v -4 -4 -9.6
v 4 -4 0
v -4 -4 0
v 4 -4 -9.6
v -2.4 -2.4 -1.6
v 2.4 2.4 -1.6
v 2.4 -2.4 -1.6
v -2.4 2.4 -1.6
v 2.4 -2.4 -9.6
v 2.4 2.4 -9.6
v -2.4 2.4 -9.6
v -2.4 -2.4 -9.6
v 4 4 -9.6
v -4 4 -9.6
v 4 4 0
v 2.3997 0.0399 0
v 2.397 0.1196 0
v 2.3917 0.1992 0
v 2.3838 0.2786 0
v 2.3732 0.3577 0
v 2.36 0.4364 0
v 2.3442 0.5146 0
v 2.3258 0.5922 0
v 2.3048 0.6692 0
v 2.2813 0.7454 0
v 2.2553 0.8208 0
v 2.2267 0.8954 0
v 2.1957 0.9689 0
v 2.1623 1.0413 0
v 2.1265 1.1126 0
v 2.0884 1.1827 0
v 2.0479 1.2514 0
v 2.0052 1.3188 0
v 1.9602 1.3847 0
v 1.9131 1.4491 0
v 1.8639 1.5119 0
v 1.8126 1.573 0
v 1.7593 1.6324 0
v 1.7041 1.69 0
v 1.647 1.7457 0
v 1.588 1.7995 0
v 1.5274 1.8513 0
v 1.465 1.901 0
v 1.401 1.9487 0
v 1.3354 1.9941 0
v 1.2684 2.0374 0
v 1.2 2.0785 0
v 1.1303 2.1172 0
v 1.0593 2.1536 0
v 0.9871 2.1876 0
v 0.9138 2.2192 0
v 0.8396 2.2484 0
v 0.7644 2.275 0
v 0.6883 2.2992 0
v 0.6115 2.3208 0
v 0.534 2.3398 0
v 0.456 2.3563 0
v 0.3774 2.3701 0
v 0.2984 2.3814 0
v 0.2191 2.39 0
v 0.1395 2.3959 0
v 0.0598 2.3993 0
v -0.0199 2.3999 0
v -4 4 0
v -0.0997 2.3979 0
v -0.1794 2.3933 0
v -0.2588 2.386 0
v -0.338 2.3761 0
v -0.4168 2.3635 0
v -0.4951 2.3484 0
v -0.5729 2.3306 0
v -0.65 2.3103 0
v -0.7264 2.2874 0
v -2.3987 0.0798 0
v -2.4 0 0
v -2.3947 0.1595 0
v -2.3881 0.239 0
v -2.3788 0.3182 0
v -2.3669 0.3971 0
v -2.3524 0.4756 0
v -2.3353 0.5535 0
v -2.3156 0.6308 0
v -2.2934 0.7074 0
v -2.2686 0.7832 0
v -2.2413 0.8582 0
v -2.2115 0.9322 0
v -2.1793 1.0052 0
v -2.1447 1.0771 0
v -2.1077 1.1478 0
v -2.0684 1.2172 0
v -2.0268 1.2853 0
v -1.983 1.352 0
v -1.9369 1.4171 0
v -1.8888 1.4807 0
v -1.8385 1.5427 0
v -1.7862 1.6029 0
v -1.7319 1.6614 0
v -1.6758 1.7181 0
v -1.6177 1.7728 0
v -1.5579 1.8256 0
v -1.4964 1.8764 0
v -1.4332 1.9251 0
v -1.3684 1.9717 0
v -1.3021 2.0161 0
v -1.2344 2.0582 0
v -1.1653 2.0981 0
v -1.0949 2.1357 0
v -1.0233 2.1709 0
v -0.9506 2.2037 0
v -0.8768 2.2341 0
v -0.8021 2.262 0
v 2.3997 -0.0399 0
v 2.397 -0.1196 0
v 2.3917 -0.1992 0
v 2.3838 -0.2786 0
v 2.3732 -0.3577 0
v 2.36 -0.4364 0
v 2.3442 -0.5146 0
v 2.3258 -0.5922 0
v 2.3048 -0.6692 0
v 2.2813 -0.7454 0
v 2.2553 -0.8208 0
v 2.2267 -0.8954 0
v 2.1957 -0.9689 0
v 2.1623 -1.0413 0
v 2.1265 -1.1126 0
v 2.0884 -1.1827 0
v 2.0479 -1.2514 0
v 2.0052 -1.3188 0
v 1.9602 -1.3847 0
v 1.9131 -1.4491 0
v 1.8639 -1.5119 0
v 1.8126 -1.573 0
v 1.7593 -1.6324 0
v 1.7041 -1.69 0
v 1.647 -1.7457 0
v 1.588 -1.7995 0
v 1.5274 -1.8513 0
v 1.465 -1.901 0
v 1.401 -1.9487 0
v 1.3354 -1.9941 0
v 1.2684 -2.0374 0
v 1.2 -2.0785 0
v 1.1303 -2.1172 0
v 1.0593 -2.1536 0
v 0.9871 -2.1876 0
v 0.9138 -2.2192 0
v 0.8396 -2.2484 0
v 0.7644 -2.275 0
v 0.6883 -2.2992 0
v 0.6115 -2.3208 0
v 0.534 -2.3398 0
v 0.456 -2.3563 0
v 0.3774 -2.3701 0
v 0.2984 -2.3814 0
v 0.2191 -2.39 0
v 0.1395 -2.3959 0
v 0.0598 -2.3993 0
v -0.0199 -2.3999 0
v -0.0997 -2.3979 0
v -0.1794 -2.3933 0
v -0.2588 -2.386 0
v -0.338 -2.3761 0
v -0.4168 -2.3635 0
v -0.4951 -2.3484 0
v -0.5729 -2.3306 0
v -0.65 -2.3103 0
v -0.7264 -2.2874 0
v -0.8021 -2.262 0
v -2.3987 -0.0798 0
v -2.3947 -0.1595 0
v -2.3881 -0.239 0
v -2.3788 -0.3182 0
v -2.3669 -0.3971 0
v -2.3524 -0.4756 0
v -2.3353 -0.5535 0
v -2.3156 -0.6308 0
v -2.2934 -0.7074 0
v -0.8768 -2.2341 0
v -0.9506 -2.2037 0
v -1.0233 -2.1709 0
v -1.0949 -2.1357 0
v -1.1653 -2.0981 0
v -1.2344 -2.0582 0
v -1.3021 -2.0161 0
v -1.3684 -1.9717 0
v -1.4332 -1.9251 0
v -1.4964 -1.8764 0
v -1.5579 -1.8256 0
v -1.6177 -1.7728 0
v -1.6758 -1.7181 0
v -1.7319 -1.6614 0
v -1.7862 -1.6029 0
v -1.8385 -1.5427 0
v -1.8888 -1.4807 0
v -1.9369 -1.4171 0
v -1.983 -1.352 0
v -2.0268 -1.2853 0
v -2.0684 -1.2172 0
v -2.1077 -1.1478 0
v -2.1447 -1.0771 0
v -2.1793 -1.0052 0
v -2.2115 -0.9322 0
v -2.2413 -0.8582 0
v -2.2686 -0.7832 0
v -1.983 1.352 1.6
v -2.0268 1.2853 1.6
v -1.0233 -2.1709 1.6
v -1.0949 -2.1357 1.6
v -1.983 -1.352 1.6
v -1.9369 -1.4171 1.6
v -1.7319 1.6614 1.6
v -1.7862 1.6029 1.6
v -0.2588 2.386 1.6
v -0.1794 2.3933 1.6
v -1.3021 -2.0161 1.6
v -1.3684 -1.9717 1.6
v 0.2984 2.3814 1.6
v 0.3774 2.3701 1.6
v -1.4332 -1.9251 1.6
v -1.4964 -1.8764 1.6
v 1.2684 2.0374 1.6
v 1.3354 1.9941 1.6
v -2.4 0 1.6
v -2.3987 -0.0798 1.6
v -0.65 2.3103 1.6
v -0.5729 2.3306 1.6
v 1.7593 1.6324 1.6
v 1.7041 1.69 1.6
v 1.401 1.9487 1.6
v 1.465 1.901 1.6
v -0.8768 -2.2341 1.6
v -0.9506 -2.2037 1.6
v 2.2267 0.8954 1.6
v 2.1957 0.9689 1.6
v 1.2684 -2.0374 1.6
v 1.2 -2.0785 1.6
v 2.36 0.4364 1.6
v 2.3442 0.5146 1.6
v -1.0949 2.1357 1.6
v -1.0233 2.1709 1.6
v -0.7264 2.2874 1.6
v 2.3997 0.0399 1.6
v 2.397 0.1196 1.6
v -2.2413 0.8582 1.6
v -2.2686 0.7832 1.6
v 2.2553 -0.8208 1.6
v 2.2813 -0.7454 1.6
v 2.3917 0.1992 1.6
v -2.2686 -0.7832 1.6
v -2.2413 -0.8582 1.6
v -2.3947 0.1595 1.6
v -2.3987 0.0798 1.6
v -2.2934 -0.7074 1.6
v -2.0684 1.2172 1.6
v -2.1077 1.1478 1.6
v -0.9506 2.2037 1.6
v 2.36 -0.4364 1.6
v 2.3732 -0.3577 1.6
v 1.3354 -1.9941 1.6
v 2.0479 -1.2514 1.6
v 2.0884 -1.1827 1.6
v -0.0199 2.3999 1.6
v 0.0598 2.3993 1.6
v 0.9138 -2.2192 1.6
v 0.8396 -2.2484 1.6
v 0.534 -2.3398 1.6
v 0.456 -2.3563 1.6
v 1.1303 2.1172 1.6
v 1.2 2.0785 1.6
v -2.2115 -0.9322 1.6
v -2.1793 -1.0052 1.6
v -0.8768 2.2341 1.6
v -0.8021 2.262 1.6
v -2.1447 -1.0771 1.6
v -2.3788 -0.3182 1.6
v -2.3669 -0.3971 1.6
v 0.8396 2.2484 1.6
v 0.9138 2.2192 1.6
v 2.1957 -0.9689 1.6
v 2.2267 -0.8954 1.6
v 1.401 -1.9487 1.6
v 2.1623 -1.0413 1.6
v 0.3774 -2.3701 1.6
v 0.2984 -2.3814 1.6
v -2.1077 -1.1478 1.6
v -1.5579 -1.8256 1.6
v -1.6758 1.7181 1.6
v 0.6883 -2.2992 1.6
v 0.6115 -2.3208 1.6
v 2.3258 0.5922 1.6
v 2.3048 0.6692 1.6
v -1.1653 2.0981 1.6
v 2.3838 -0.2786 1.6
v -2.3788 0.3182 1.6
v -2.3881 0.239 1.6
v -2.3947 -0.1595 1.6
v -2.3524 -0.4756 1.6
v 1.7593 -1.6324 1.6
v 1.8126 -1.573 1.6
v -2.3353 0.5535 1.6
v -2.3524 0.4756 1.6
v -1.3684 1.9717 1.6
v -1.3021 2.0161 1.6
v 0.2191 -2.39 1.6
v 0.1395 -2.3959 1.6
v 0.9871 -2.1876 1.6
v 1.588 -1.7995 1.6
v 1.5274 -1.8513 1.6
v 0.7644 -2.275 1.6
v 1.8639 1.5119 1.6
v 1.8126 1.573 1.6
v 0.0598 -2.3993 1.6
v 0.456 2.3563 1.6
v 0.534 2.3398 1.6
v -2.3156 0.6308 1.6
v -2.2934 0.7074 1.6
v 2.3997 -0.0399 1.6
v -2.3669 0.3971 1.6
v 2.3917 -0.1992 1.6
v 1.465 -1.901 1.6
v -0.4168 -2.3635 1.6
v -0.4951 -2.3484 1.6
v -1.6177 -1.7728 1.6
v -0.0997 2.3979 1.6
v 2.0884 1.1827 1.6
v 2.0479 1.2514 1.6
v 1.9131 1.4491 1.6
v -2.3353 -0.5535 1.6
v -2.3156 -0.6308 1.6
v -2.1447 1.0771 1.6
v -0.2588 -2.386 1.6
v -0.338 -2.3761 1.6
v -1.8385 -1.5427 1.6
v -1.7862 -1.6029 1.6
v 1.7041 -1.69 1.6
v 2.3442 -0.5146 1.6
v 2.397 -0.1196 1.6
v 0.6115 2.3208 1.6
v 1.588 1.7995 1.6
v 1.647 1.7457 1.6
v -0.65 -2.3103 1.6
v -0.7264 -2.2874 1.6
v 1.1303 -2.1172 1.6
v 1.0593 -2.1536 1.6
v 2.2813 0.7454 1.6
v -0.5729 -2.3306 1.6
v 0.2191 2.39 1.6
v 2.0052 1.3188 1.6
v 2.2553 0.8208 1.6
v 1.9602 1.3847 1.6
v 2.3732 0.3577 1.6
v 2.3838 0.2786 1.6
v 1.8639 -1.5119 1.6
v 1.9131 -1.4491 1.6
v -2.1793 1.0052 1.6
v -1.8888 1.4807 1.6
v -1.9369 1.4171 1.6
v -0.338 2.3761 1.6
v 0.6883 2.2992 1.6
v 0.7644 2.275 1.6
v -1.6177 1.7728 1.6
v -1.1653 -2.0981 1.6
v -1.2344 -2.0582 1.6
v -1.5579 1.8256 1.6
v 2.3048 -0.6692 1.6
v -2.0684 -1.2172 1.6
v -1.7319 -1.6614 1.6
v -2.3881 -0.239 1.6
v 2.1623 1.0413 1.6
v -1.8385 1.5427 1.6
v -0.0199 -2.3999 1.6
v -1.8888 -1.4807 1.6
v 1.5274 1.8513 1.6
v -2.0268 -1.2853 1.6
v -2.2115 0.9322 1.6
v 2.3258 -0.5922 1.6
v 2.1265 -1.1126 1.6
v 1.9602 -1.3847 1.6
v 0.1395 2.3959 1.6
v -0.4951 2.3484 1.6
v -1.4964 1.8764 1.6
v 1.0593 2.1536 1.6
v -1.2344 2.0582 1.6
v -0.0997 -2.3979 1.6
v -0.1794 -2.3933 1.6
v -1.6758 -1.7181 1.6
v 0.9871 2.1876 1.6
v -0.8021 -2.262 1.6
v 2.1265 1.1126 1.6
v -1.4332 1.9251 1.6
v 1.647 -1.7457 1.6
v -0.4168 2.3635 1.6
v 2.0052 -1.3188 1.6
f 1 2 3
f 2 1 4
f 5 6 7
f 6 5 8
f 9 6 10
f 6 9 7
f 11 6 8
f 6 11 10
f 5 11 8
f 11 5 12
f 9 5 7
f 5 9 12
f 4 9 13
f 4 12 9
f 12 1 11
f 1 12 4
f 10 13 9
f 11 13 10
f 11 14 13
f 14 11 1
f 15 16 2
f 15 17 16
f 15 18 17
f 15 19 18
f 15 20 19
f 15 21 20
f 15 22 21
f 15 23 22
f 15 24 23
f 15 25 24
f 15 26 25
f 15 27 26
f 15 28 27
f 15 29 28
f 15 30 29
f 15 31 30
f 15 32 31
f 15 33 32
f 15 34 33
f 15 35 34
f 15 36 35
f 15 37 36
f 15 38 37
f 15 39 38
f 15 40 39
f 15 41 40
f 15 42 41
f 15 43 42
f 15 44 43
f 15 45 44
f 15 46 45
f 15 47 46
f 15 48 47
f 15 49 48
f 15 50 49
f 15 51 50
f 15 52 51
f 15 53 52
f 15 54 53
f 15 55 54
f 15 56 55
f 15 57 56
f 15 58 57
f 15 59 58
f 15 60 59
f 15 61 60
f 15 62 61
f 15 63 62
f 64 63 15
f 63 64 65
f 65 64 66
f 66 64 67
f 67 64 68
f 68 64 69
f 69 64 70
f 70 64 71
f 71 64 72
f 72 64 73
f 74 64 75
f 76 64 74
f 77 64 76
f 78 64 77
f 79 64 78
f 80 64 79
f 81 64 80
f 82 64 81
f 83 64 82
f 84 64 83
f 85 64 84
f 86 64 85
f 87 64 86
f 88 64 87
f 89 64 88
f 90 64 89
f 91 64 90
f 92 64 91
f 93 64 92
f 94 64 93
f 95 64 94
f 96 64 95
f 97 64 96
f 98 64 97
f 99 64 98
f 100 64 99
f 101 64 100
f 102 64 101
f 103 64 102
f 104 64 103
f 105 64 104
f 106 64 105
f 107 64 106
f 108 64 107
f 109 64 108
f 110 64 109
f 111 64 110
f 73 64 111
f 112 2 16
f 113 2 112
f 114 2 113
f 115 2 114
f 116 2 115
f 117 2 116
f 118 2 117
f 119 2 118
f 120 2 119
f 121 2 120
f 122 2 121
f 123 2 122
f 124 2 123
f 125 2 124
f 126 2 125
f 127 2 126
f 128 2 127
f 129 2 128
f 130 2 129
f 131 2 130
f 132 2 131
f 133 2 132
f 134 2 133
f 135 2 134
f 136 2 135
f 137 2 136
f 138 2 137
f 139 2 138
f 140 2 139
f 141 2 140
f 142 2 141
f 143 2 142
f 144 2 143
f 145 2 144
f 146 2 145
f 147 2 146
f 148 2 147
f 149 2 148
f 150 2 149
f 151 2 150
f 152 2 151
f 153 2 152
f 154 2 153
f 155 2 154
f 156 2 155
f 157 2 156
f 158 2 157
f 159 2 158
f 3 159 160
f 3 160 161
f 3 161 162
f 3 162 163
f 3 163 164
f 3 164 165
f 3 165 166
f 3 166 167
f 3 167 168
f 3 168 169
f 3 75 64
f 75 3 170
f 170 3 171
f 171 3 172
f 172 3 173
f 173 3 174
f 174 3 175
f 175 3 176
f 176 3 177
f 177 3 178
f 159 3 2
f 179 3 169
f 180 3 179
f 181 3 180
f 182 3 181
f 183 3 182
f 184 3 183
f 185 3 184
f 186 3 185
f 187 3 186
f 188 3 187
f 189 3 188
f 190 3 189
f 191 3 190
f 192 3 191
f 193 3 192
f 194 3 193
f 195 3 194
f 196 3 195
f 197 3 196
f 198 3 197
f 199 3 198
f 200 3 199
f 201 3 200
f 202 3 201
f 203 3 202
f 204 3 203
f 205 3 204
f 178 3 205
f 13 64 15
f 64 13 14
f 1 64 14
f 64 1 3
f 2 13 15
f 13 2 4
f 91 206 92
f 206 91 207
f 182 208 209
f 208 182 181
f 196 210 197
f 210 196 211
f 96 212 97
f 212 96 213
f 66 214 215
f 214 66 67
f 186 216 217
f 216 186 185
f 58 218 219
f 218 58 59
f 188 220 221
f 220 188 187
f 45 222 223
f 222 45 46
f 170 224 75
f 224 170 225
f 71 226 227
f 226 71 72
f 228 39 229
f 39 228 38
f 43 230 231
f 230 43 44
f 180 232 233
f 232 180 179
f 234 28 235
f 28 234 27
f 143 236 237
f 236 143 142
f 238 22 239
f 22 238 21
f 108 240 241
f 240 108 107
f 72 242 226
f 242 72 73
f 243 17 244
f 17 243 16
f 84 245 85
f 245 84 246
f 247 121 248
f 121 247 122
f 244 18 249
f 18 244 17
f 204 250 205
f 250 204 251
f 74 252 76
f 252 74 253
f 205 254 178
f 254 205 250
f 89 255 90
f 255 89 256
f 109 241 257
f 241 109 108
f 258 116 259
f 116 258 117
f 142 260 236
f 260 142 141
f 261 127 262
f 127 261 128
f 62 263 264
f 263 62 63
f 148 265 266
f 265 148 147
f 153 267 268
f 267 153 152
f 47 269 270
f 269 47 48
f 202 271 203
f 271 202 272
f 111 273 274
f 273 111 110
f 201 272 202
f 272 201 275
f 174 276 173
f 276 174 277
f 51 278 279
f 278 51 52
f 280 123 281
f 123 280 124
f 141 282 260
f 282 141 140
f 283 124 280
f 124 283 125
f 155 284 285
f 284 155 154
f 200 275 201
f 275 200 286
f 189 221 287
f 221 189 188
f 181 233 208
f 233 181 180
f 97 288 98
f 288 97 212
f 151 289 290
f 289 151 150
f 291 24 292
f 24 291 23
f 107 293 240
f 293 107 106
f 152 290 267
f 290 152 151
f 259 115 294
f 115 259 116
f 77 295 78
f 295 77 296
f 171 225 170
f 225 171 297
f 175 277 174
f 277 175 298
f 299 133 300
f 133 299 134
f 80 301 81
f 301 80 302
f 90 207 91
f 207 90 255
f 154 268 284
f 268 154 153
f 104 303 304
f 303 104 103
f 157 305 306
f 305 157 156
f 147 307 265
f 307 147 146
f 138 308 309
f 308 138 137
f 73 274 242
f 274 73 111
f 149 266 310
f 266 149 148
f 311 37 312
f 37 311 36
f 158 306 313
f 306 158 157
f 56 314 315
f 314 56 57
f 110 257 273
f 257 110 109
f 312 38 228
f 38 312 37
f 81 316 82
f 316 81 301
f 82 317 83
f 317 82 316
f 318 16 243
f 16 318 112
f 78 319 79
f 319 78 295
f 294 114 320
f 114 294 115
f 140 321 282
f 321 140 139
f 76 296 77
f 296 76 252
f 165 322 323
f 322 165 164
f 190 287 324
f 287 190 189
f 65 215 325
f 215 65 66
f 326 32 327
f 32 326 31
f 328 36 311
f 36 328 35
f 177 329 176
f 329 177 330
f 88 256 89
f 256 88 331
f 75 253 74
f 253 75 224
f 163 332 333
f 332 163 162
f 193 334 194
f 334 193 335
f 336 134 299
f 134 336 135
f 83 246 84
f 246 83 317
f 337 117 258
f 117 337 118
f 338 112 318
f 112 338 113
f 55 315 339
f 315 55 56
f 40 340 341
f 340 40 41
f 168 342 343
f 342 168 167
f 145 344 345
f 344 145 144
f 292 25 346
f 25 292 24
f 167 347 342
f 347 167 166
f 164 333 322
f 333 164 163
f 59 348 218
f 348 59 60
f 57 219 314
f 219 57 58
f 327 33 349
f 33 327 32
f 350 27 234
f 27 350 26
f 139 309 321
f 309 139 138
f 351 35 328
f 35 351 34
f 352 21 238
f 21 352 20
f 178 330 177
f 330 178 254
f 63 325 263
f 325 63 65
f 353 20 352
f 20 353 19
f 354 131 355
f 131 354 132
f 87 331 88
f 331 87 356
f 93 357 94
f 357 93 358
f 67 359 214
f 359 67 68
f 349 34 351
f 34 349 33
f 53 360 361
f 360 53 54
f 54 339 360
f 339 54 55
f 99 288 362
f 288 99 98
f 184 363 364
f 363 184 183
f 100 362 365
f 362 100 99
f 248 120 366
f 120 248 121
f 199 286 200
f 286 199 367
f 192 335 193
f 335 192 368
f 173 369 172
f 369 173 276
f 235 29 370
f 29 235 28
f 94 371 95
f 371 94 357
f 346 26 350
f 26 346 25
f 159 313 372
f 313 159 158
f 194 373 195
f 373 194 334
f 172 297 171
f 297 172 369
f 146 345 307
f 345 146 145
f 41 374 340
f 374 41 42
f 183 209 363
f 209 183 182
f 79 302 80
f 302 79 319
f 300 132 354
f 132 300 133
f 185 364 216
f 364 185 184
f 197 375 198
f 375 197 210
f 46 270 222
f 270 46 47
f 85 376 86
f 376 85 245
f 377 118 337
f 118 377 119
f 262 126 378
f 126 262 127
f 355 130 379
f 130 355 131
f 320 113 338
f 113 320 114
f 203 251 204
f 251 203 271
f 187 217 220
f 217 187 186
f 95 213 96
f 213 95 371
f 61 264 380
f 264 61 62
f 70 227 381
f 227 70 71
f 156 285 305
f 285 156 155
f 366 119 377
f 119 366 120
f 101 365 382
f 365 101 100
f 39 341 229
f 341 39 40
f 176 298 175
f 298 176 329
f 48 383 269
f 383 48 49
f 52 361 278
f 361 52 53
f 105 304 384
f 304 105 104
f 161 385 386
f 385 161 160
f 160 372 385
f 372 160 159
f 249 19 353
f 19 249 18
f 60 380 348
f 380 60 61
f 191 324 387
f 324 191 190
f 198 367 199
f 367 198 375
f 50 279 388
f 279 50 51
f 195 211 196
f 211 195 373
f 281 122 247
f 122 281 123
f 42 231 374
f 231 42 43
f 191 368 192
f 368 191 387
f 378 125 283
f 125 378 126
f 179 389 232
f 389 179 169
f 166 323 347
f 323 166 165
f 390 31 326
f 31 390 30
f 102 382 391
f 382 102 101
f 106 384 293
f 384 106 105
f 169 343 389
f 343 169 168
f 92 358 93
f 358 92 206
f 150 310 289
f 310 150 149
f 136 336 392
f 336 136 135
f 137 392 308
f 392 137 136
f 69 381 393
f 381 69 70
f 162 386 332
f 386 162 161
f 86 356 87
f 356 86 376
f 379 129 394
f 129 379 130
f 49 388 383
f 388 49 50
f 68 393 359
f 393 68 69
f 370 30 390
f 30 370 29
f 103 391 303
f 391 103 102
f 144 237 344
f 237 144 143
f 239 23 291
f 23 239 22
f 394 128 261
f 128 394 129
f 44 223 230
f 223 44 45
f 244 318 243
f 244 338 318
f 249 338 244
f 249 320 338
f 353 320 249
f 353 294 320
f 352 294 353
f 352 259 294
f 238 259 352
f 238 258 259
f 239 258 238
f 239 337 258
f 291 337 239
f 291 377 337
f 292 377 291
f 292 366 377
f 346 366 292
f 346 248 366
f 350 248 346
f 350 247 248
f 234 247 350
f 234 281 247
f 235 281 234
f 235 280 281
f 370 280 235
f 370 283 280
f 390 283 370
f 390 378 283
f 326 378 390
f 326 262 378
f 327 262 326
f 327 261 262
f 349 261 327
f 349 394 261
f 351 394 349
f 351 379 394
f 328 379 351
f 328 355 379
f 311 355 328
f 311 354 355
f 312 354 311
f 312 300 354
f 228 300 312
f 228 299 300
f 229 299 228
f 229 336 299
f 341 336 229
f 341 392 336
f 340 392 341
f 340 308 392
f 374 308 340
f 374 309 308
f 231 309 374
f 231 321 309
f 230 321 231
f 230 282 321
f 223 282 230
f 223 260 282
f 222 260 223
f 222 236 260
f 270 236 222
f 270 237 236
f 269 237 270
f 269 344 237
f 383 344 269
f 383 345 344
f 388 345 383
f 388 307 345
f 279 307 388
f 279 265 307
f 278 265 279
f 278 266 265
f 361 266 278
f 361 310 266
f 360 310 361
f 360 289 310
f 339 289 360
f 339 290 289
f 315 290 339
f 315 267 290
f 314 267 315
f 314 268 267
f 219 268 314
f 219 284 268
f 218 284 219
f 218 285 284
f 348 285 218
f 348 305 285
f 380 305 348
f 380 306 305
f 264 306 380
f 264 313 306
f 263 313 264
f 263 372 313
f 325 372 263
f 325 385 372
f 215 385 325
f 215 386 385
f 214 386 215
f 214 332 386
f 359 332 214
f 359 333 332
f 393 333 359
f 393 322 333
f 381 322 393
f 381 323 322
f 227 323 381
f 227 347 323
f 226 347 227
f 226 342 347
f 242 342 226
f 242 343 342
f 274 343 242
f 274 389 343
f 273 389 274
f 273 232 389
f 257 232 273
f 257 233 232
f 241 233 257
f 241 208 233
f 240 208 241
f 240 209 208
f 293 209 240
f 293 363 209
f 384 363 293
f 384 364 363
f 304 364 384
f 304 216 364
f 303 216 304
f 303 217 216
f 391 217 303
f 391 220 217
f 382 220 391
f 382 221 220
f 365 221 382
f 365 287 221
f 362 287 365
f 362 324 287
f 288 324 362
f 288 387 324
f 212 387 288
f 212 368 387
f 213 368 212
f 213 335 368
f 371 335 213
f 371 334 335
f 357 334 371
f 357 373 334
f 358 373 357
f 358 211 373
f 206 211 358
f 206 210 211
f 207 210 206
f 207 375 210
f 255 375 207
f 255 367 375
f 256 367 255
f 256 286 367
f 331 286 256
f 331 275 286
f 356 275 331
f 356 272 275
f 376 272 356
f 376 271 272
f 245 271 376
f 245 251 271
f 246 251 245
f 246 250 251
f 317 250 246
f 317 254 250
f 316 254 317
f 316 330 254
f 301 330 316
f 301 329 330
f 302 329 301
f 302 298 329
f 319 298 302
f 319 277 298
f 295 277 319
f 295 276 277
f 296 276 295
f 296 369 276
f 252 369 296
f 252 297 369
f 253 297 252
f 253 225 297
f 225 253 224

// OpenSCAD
// file: ../p/stud3.scad
use <../lib.scad>
use <4-4cyli.scad>
use <4-4disc.scad>
use <4-4edge.scad>
$fa=1; $fs=0.2;
function ldraw_lib__stud3(realsolid=false) = realsolid ? 
    [openscad(translate([0,0,-eps()], o=cylinder(4+eps(), r=4)),2)] : [
// 0 Stud Tube Solid
// 0 Name: stud3.dat
// 0 Author: James Jessiman
// 0 !LDRAW_ORG Primitive UPDATE 2012-01
// 0 !LICENSE Licensed under CC BY 2.0 and CC BY 4.0 : see CAreadme.txt
// 
// 0 BFC CERTIFY CCW
  [0,"BFC","CERTIFY"],
  [0,"BFC","CCW"],
// 
// 0 !HISTORY 2002-04-04 [sbliss] Modified for BFC compliance
// 0 !HISTORY 2002-04-25 [PTadmin] Official Update 2002-02
// 0 !HISTORY 2007-06-24 [PTadmin] Header formatted for Contributor Agreement
// 0 !HISTORY 2008-07-01 [PTadmin] Official Update 2008-01
// 0 !HISTORY 2012-02-16 [Philo] Changed to CCW
// 0 !HISTORY 2012-03-30 [PTadmin] Official Update 2012-01
// 
// 
// 1 16 0 -4 0 4 0 0 0 1 0 0 0 4 4-4edge.dat
  [1,16,0,-4,0,4,0,0,0,1,0,0,0,4, ldraw_lib__4_4edge(realsolid)],
// 1 16 0 0 0 4 0 0 0 1 0 0 0 4 4-4edge.dat
  [1,16,0,0,0,4,0,0,0,1,0,0,0,4, ldraw_lib__4_4edge(realsolid)],
// 1 16 0 -4 0 4 0 0 0 1 0 0 0 4 4-4disc.dat
  [1,16,0,-4,0,4,0,0,0,1,0,0,0,4, ldraw_lib__4_4disc(realsolid)],
// 1 16 0 -4 0 4 0 0 0 4 0 0 0 4 4-4cyli.dat
  [1,16,0,-4,0,4,0,0,0,4,0,0,0,4, ldraw_lib__4_4cyli(realsolid)],
];
module ldraw_lib__stud3(step=0, col=false, unit=2/5, alt=false, line=0.2, solid=!$preview)
    makepoly(ldraw_lib__stud3(solid), step=step, col=col, unit=unit, alt=alt, line=line, solid=solid);
ldraw_lib__stud3(line=0.2);
// file: ../p/4-4edge.scad
use <../lib.scad>
$fa=1; $fs=0.2;
function ldraw_lib__4_4edge(realsolid=false) = [
// 0 Circle 1.0
// 0 Name: 4-4edge.dat
// 0 Author: James Jessiman
// 0 !LDRAW_ORG Primitive UPDATE 2017-01
// 0 !LICENSE Licensed under CC BY 2.0 and CC BY 4.0 : see CAreadme.txt
// 
// 0 BFC CERTIFY CCW
  [0,"BFC","CERTIFY"],
  [0,"BFC","CCW"],
// 
// 0 !HISTORY 1998-12-15 [PTadmin] Official Update 1998-10
// 0 !HISTORY 2005-12-28 [PTadmin] Official Update 2005-01
// 0 !HISTORY 2007-06-24 [PTadmin] Header formatted for Contributor Agreement
// 0 !HISTORY 2008-07-01 [PTadmin] Official Update 2008-01
// 0 !HISTORY 2017-01-15 [Steffen] BFCed
// 0 !HISTORY 2017-12-30 [PTadmin] Official Update 2017-01
// 
// 
// 2 24 1 0 0 0.9239 0 0.3827
  [2,24,1,0,0,0.9239,0,0.3827],
// 2 24 0.9239 0 0.3827 0.7071 0 0.7071
  [2,24,0.9239,0,0.3827,0.7071,0,0.7071],
// 2 24 0.7071 0 0.7071 0.3827 0 0.9239
  [2,24,0.7071,0,0.7071,0.3827,0,0.9239],
// 2 24 0.3827 0 0.9239 0 0 1
  [2,24,0.3827,0,0.9239,0,0,1],
// 2 24 0 0 1 -0.3827 0 0.9239
  [2,24,0,0,1,-0.3827,0,0.9239],
// 2 24 -0.3827 0 0.9239 -0.7071 0 0.7071
  [2,24,-0.3827,0,0.9239,-0.7071,0,0.7071],
// 2 24 -0.7071 0 0.7071 -0.9239 0 0.3827
  [2,24,-0.7071,0,0.7071,-0.9239,0,0.3827],
// 2 24 -0.9239 0 0.3827 -1 0 -0
  [2,24,-0.9239,0,0.3827,-1,0,-0],
// 2 24 -1 0 -0 -0.9239 0 -0.3827
  [2,24,-1,0,-0,-0.9239,0,-0.3827],
// 2 24 -0.9239 0 -0.3827 -0.7071 0 -0.7071
  [2,24,-0.9239,0,-0.3827,-0.7071,0,-0.7071],
// 2 24 -0.7071 0 -0.7071 -0.3827 0 -0.9239
  [2,24,-0.7071,0,-0.7071,-0.3827,0,-0.9239],
// 2 24 -0.3827 0 -0.9239 0 0 -1
  [2,24,-0.3827,0,-0.9239,0,0,-1],
// 2 24 0 0 -1 0.3827 0 -0.9239
  [2,24,0,0,-1,0.3827,0,-0.9239],
// 2 24 0.3827 0 -0.9239 0.7071 0 -0.7071
  [2,24,0.3827,0,-0.9239,0.7071,0,-0.7071],
// 2 24 0.7071 0 -0.7071 0.9239 0 -0.3827
  [2,24,0.7071,0,-0.7071,0.9239,0,-0.3827],
// 2 24 0.9239 0 -0.3827 1 0 0
  [2,24,0.9239,0,-0.3827,1,0,0],
];
module ldraw_lib__4_4edge(step=0, col=false, unit=2/5, alt=false, line=0.2, solid=!$preview)
    makepoly(ldraw_lib__4_4edge(solid), step=step, col=col, unit=unit, alt=alt, line=line, solid=solid);
ldraw_lib__4_4edge(line=0.2);
// file: ../p/4-4disc.scad
use <../lib.scad>
$fa=1; $fs=0.2;
function ldraw_lib__4_4disc(realsolid=false) = [
// 0 Disc 1.0
// 0 Name: 4-4disc.dat
// 0 Author: James Jessiman
// 0 !LDRAW_ORG Primitive UPDATE 2002-02
// 0 !LICENSE Licensed under CC BY 2.0 and CC BY 4.0 : see CAreadme.txt
// 
// 0 BFC CERTIFY CCW
  [0,"BFC","CERTIFY"],
  [0,"BFC","CCW"],
// 
// 0 !HISTORY 1998-12-15 [PTadmin] Official Update 1998-10
// 0 !HISTORY 2002-03-23 [sbliss] Added BFC statement
// 0 !HISTORY 2002-04-25 [PTadmin] Official Update 2002-02
// 0 !HISTORY 2007-06-24 [PTadmin] Header formatted for Contributor Agreement
// 0 !HISTORY 2008-07-01 [PTadmin] Official Update 2008-01
// 
// 
// 3 16 0 0 0 1 0 0 0.9239 0 0.3827
  [3,16,0,0,0,1,0,0,0.9239,0,0.3827],
// 3 16 0 0 0 0.9239 0 0.3827 0.7071 0 0.7071
  [3,16,0,0,0,0.9239,0,0.3827,0.7071,0,0.7071],
// 3 16 0 0 0 0.7071 0 0.7071 0.3827 0 0.9239
  [3,16,0,0,0,0.7071,0,0.7071,0.3827,0,0.9239],
// 3 16 0 0 0 0.3827 0 0.9239 0 0 1
  [3,16,0,0,0,0.3827,0,0.9239,0,0,1],
// 3 16 0 0 0 0 0 1 -0.3827 0 0.9239
  [3,16,0,0,0,0,0,1,-0.3827,0,0.9239],
// 3 16 0 0 0 -0.3827 0 0.9239 -0.7071 0 0.7071
  [3,16,0,0,0,-0.3827,0,0.9239,-0.7071,0,0.7071],
// 3 16 0 0 0 -0.7071 0 0.7071 -0.9239 0 0.3827
  [3,16,0,0,0,-0.7071,0,0.7071,-0.9239,0,0.3827],
// 3 16 0 0 0 -0.9239 0 0.3827 -1 0 -0
  [3,16,0,0,0,-0.9239,0,0.3827,-1,0,-0],
// 3 16 0 0 0 -1 0 -0 -0.9239 0 -0.3827
  [3,16,0,0,0,-1,0,-0,-0.9239,0,-0.3827],
// 3 16 0 0 0 -0.9239 0 -0.3827 -0.7071 0 -0.7071
  [3,16,0,0,0,-0.9239,0,-0.3827,-0.7071,0,-0.7071],
// 3 16 0 0 0 -0.7071 0 -0.7071 -0.3827 0 -0.9239
  [3,16,0,0,0,-0.7071,0,-0.7071,-0.3827,0,-0.9239],
// 3 16 0 0 0 -0.3827 0 -0.9239 0 0 -1
  [3,16,0,0,0,-0.3827,0,-0.9239,0,0,-1],
// 3 16 0 0 0 0 0 -1 0.3827 0 -0.9239
  [3,16,0,0,0,0,0,-1,0.3827,0,-0.9239],
// 3 16 0 0 0 0.3827 0 -0.9239 0.7071 0 -0.7071
  [3,16,0,0,0,0.3827,0,-0.9239,0.7071,0,-0.7071],
// 3 16 0 0 0 0.7071 0 -0.7071 0.9239 0 -0.3827
  [3,16,0,0,0,0.7071,0,-0.7071,0.9239,0,-0.3827],
// 3 16 0 0 0 0.9239 0 -0.3827 1 0 0
  [3,16,0,0,0,0.9239,0,-0.3827,1,0,0],
// 0
];
module ldraw_lib__4_4disc(step=0, col=false, unit=2/5, alt=false, line=0.2, solid=!$preview)
    makepoly(ldraw_lib__4_4disc(solid), step=step, col=col, unit=unit, alt=alt, line=line, solid=solid);
ldraw_lib__4_4disc(line=0.2);
// file: ../p/4-4cyli.scad
use <../lib.scad>
$fa=1; $fs=0.2;
function ldraw_lib__4_4cyli(realsolid=false) = [
// 0 Cylinder 1.0
// 0 Name: 4-4cyli.dat
// 0 Author: James Jessiman
// 0 !LDRAW_ORG Primitive UPDATE 2005-01
// 0 !LICENSE Licensed under CC BY 2.0 and CC BY 4.0 : see CAreadme.txt
// 
// 0 BFC CERTIFY CCW
  [0,"BFC","CERTIFY"],
  [0,"BFC","CCW"],
// 
// 0 !HISTORY 1998-12-15 [PTadmin] Official Update 1998-10
// 0 !HISTORY 2002-03-23 [sbliss] Added BFC statement; merged headers from files in distributions LDraw 0.27 and Complete.
// 0 !HISTORY 2002-04-25 [PTadmin] Official Update 2002-02
// 0 !HISTORY 2004-12-14 [guyvivan] BFC CCW
// 0 !HISTORY 2005-12-28 [PTadmin] Official Update 2005-01
// 0 !HISTORY 2007-06-24 [PTadmin] Header formatted for Contributor Agreement
// 0 !HISTORY 2008-07-01 [PTadmin] Official Update 2008-01
// 
// 
// 4 16 1 1 0 0.9239 1 0.3827 0.9239 0 0.3827 1 0 0
  [4,16,1,1,0,0.9239,1,0.3827,0.9239,0,0.3827,1,0,0],
// 5 24 1 0 0 1 1 0 0.9239 0 0.3827 0.9239 0 -0.3827
  [5,24,1,0,0,1,1,0,0.9239,0,0.3827,0.9239,0,-0.3827],
// 4 16 0.9239 1 0.3827 0.7071 1 0.7071 0.7071 0 0.7071 0.9239 0 0.3827
  [4,16,0.9239,1,0.3827,0.7071,1,0.7071,0.7071,0,0.7071,0.9239,0,0.3827],
// 5 24 0.9239 0 0.3827 0.9239 1 0.3827 0.7071 0 0.7071 1 0 0
  [5,24,0.9239,0,0.3827,0.9239,1,0.3827,0.7071,0,0.7071,1,0,0],
// 4 16 0.7071 1 0.7071 0.3827 1 0.9239 0.3827 0 0.9239 0.7071 0 0.7071
  [4,16,0.7071,1,0.7071,0.3827,1,0.9239,0.3827,0,0.9239,0.7071,0,0.7071],
// 5 24 0.7071 0 0.7071 0.7071 1 0.7071 0.3827 0 0.9239 0.9239 0 0.3827
  [5,24,0.7071,0,0.7071,0.7071,1,0.7071,0.3827,0,0.9239,0.9239,0,0.3827],
// 4 16 0.3827 1 0.9239 0 1 1 0 0 1 0.3827 0 0.9239
  [4,16,0.3827,1,0.9239,0,1,1,0,0,1,0.3827,0,0.9239],
// 5 24 0.3827 0 0.9239 0.3827 1 0.9239 0 0 1 0.7071 0 0.7071
  [5,24,0.3827,0,0.9239,0.3827,1,0.9239,0,0,1,0.7071,0,0.7071],
// 4 16 0 1 1 -0.3827 1 0.9239 -0.3827 0 0.9239 0 0 1
  [4,16,0,1,1,-0.3827,1,0.9239,-0.3827,0,0.9239,0,0,1],
// 5 24 0 0 1 0 1 1 -0.3827 0 0.9239 0.3827 0 0.9239
  [5,24,0,0,1,0,1,1,-0.3827,0,0.9239,0.3827,0,0.9239],
// 4 16 -0.3827 1 0.9239 -0.7071 1 0.7071 -0.7071 0 0.7071 -0.3827 0 0.9239
  [4,16,-0.3827,1,0.9239,-0.7071,1,0.7071,-0.7071,0,0.7071,-0.3827,0,0.9239],
// 5 24 -0.3827 0 0.9239 -0.3827 1 0.9239 -0.7071 0 0.7071 0 0 1
  [5,24,-0.3827,0,0.9239,-0.3827,1,0.9239,-0.7071,0,0.7071,0,0,1],
// 4 16 -0.7071 1 0.7071 -0.9239 1 0.3827 -0.9239 0 0.3827 -0.7071 0 0.7071
  [4,16,-0.7071,1,0.7071,-0.9239,1,0.3827,-0.9239,0,0.3827,-0.7071,0,0.7071],
// 5 24 -0.7071 0 0.7071 -0.7071 1 0.7071 -0.9239 0 0.3827 -0.3827 0 0.9239
  [5,24,-0.7071,0,0.7071,-0.7071,1,0.7071,-0.9239,0,0.3827,-0.3827,0,0.9239],
// 4 16 -0.9239 1 0.3827 -1 1 0 -1 0 0 -0.9239 0 0.3827
  [4,16,-0.9239,1,0.3827,-1,1,0,-1,0,0,-0.9239,0,0.3827],
// 5 24 -0.9239 0 0.3827 -0.9239 1 0.3827 -1 0 0 -0.7071 0 0.7071
  [5,24,-0.9239,0,0.3827,-0.9239,1,0.3827,-1,0,0,-0.7071,0,0.7071],
// 4 16 -1 1 0 -0.9239 1 -0.3827 -0.9239 0 -0.3827 -1 0 0
  [4,16,-1,1,0,-0.9239,1,-0.3827,-0.9239,0,-0.3827,-1,0,0],
// 5 24 -1 0 0 -1 1 0 -0.9239 0 -0.3827 -0.9239 0 0.3827
  [5,24,-1,0,0,-1,1,0,-0.9239,0,-0.3827,-0.9239,0,0.3827],
// 4 16 -0.9239 1 -0.3827 -0.7071 1 -0.7071 -0.7071 0 -0.7071 -0.9239 0 -0.3827
  [4,16,-0.9239,1,-0.3827,-0.7071,1,-0.7071,-0.7071,0,-0.7071,-0.9239,0,-0.3827],
// 5 24 -0.9239 0 -0.3827 -0.9239 1 -0.3827 -0.7071 0 -0.7071 -1 0 0
  [5,24,-0.9239,0,-0.3827,-0.9239,1,-0.3827,-0.7071,0,-0.7071,-1,0,0],
// 4 16 -0.7071 1 -0.7071 -0.3827 1 -0.9239 -0.3827 0 -0.9239 -0.7071 0 -0.7071
  [4,16,-0.7071,1,-0.7071,-0.3827,1,-0.9239,-0.3827,0,-0.9239,-0.7071,0,-0.7071],
// 5 24 -0.7071 0 -0.7071 -0.7071 1 -0.7071 -0.3827 0 -0.9239 -0.9239 0 -0.3827
  [5,24,-0.7071,0,-0.7071,-0.7071,1,-0.7071,-0.3827,0,-0.9239,-0.9239,0,-0.3827],
// 4 16 -0.3827 1 -0.9239 0 1 -1 0 0 -1 -0.3827 0 -0.9239
  [4,16,-0.3827,1,-0.9239,0,1,-1,0,0,-1,-0.3827,0,-0.9239],
// 5 24 -0.3827 0 -0.9239 -0.3827 1 -0.9239 0 0 -1 -0.7071 0 -0.7071
  [5,24,-0.3827,0,-0.9239,-0.3827,1,-0.9239,0,0,-1,-0.7071,0,-0.7071],
// 4 16 0 1 -1 0.3827 1 -0.9239 0.3827 0 -0.9239 0 0 -1
  [4,16,0,1,-1,0.3827,1,-0.9239,0.3827,0,-0.9239,0,0,-1],
// 5 24 0 0 -1 0 1 -1 0.3827 0 -0.9239 -0.3827 0 -0.9239
  [5,24,0,0,-1,0,1,-1,0.3827,0,-0.9239,-0.3827,0,-0.9239],
// 4 16 0.3827 1 -0.9239 0.7071 1 -0.7071 0.7071 0 -0.7071 0.3827 0 -0.9239
  [4,16,0.3827,1,-0.9239,0.7071,1,-0.7071,0.7071,0,-0.7071,0.3827,0,-0.9239],
// 5 24 0.3827 0 -0.9239 0.3827 1 -0.9239 0.7071 0 -0.7071 0 0 -1
  [5,24,0.3827,0,-0.9239,0.3827,1,-0.9239,0.7071,0,-0.7071,0,0,-1],
// 4 16 0.7071 1 -0.7071 0.9239 1 -0.3827 0.9239 0 -0.3827 0.7071 0 -0.7071
  [4,16,0.7071,1,-0.7071,0.9239,1,-0.3827,0.9239,0,-0.3827,0.7071,0,-0.7071],
// 5 24 0.7071 0 -0.7071 0.7071 1 -0.7071 0.9239 0 -0.3827 0.3827 0 -0.9239
  [5,24,0.7071,0,-0.7071,0.7071,1,-0.7071,0.9239,0,-0.3827,0.3827,0,-0.9239],
// 4 16 0.9239 1 -0.3827 1 1 0 1 0 0 0.9239 0 -0.3827
  [4,16,0.9239,1,-0.3827,1,1,0,1,0,0,0.9239,0,-0.3827],
// 5 24 0.9239 0 -0.3827 0.9239 1 -0.3827 1 0 0 0.7071 0 -0.7071
  [5,24,0.9239,0,-0.3827,0.9239,1,-0.3827,1,0,0,0.7071,0,-0.7071],
// 0
];
module ldraw_lib__4_4cyli(step=0, col=false, unit=2/5, alt=false, line=0.2, solid=!$preview)
    makepoly(ldraw_lib__4_4cyli(solid), step=step, col=col, unit=unit, alt=alt, line=line, solid=solid);
ldraw_lib__4_4cyli(line=0.2);
// file: s/3004s01.scad
use <../../lib.scad>
use <../../p/box4t.scad>
use <../../p/box5.scad>
use <../../p/stud.scad>
use <../../p/stud3.scad>
$fa=1; $fs=0.2;
function ldraw_lib__s__3004s01(realsolid=false) = [
// 0 ~Brick  1 x  2 without Front Face
// 0 Name: s\3004s01.dat
// 0 Author: James Jessiman
// 0 !LDRAW_ORG Subpart UPDATE 2003-03
// 0 !LICENSE Licensed under CC BY 2.0 and CC BY 4.0 : see CAreadme.txt
// 
// 0 BFC CERTIFY CCW
  [0,"BFC","CERTIFY"],
  [0,"BFC","CCW"],
// 
// 0 !HISTORY 2003-09-07 [jriley] Subfiling, BFC
// 0 !HISTORY 2003-12-19 [PTadmin] Official Update 2003-03
// 0 !HISTORY 2007-08-29 [PTadmin] Header formatted for Contributor Agreement
// 0 !HISTORY 2008-07-01 [PTadmin] Official Update 2008-01
// 
// 
// 1 16 0 4 0 1 0 0 0 -5 0 0 0 1 stud3.dat
  [1,16,0,4,0,1,0,0,0,-5,0,0,0,1, ldraw_lib__stud3(realsolid)],
// 0 BFC INVERTNEXT
  [0,"BFC","INVERTNEXT"],
// 1 16 0 24 0 16 0 0 0 -20 0 0 0 6 box5.dat
  [1,16,0,24,0,16,0,0,0,-20,0,0,0,6, ldraw_lib__box5(realsolid)],
// 4 16 20 24 10 16 24 6 -16 24 6 -20 24 10
  [4,16,20,24,10,16,24,6,-16,24,6,-20,24,10],
// 4 16 -20 24 10 -16 24 6 -16 24 -6 -20 24 -10
  [4,16,-20,24,10,-16,24,6,-16,24,-6,-20,24,-10],
// 4 16 -20 24 -10 -16 24 -6 16 24 -6 20 24 -10
  [4,16,-20,24,-10,-16,24,-6,16,24,-6,20,24,-10],
// 4 16 20 24 -10 16 24 -6 16 24 6 20 24 10
  [4,16,20,24,-10,16,24,-6,16,24,6,20,24,10],
// 1 16 0 24 0 20 0 0 0 -24 0 0 0 10 box4t.dat
  [1,16,0,24,0,20,0,0,0,-24,0,0,0,10, ldraw_lib__box4t(realsolid)],
// 1 16 10 0 0 1 0 0 0 1 0 0 0 1 stud.dat
  [1,16,10,0,0,1,0,0,0,1,0,0,0,1, ldraw_lib__stud(realsolid)],
// 1 16 -10 0 0 1 0 0 0 1 0 0 0 1 stud.dat
  [1,16,-10,0,0,1,0,0,0,1,0,0,0,1, ldraw_lib__stud(realsolid)],
// 0
];
module ldraw_lib__s__3004s01(step=0, col=false, unit=2/5, alt=false, line=0.2, solid=!$preview)
    makepoly(ldraw_lib__s__3004s01(solid), step=step, col=col, unit=unit, alt=alt, line=line, solid=solid);
ldraw_lib__s__3004s01(line=0.2);
// file: ../p/stud.scad
use <../lib.scad>
use <4-4cyli.scad>
use <4-4disc.scad>
use <4-4edge.scad>
$fa=1; $fs=0.2;
function ldraw_lib__stud(realsolid=false) = realsolid ? 
    [openscad(translate([0,0,-eps()], o=cylinder(4+eps(), r=6)),2)] : [
// 0 Stud
// 0 Name: stud.dat
// 0 Author: James Jessiman
// 0 !LDRAW_ORG Primitive UPDATE 2012-01
// 0 !LICENSE Licensed under CC BY 2.0 and CC BY 4.0 : see CAreadme.txt
// 
// 0 BFC CERTIFY CCW
  [0,"BFC","CERTIFY"],
  [0,"BFC","CCW"],
// 
// 0 !HISTORY 2002-04-04 [sbliss] Modified for BFC compliance
// 0 !HISTORY 2002-04-25 [PTadmin] Official Update 2002-02
// 0 !HISTORY 2007-06-24 [PTadmin] Header formatted for Contributor Agreement
// 0 !HISTORY 2008-07-01 [PTadmin] Official Update 2008-01
// 0 !HISTORY 2012-02-16 [Philo] Changed to CCW
// 0 !HISTORY 2012-03-30 [PTadmin] Official Update 2012-01
// 
// 
// 1 16 0 0 0 6 0 0 0 1 0 0 0 6 4-4edge.dat
  [1,16,0,0,0,6,0,0,0,1,0,0,0,6, ldraw_lib__4_4edge(realsolid)],
// 1 16 0 -4 0 6 0 0 0 1 0 0 0 6 4-4edge.dat
  [1,16,0,-4,0,6,0,0,0,1,0,0,0,6, ldraw_lib__4_4edge(realsolid)],
// 1 16 0 0 0 6 0 0 0 -4 0 0 0 6 4-4cyli.dat
  [1,16,0,0,0,6,0,0,0,-4,0,0,0,6, ldraw_lib__4_4cyli(realsolid)],
// 1 16 0 -4 0 6 0 0 0 1 0 0 0 6 4-4disc.dat
  [1,16,0,-4,0,6,0,0,0,1,0,0,0,6, ldraw_lib__4_4disc(realsolid)],
];
module ldraw_lib__stud(step=0, col=false, unit=2/5, alt=false, line=0.2, solid=!$preview)
    makepoly(ldraw_lib__stud(solid), step=step, col=col, unit=unit, alt=alt, line=line, solid=solid);
ldraw_lib__stud(line=0.2);
// file: ../p/box5.scad
use <../lib.scad>
$fa=1; $fs=0.2;
function ldraw_lib__box5(realsolid=false) = [
// 0 Box with 5 Faces and All Edges
// 0 Name: box5.dat
// 0 Author: James Jessiman
// 0 !LDRAW_ORG Primitive UPDATE 2012-01
// 0 !LICENSE Licensed under CC BY 2.0 and CC BY 4.0 : see CAreadme.txt
// 
// 0 BFC CERTIFY CCW
  [0,"BFC","CERTIFY"],
  [0,"BFC","CCW"],
// 
// 0 !HISTORY 2002-04-03 [sbliss] Modified for BFC compliance
// 0 !HISTORY 2002-04-25 [PTadmin] Official Update 2002-02
// 0 !HISTORY 2007-06-24 [PTadmin] Header formatted for Contributor Agreement
// 0 !HISTORY 2008-07-01 [PTadmin] Official Update 2008-01
// 0 !HISTORY 2012-02-16 [Philo] Changed to CCW
// 0 !HISTORY 2012-03-30 [PTadmin] Official Update 2012-01
// 
// 
// 2 24 1 1 1 -1 1 1
  [2,24,1,1,1,-1,1,1],
// 2 24 -1 1 1 -1 1 -1
  [2,24,-1,1,1,-1,1,-1],
// 2 24 -1 1 -1 1 1 -1
  [2,24,-1,1,-1,1,1,-1],
// 2 24 1 1 -1 1 1 1
  [2,24,1,1,-1,1,1,1],
// 2 24 1 0 1 -1 0 1
  [2,24,1,0,1,-1,0,1],
// 2 24 -1 0 1 -1 0 -1
  [2,24,-1,0,1,-1,0,-1],
// 2 24 -1 0 -1 1 0 -1
  [2,24,-1,0,-1,1,0,-1],
// 2 24 1 0 -1 1 0 1
  [2,24,1,0,-1,1,0,1],
// 2 24 1 0 1 1 1 1
  [2,24,1,0,1,1,1,1],
// 2 24 -1 0 1 -1 1 1
  [2,24,-1,0,1,-1,1,1],
// 2 24 1 0 -1 1 1 -1
  [2,24,1,0,-1,1,1,-1],
// 2 24 -1 0 -1 -1 1 -1
  [2,24,-1,0,-1,-1,1,-1],
// 4 16 -1 1 1 1 1 1 1 1 -1 -1 1 -1
  [4,16,-1,1,1,1,1,1,1,1,-1,-1,1,-1],
// 4 16 -1 1 1 -1 0 1 1 0 1 1 1 1
  [4,16,-1,1,1,-1,0,1,1,0,1,1,1,1],
// 4 16 -1 1 -1 -1 0 -1 -1 0 1 -1 1 1
  [4,16,-1,1,-1,-1,0,-1,-1,0,1,-1,1,1],
// 4 16 1 1 -1 1 0 -1 -1 0 -1 -1 1 -1
  [4,16,1,1,-1,1,0,-1,-1,0,-1,-1,1,-1],
// 4 16 1 1 1 1 0 1 1 0 -1 1 1 -1
  [4,16,1,1,1,1,0,1,1,0,-1,1,1,-1],
];
module ldraw_lib__box5(step=0, col=false, unit=2/5, alt=false, line=0.2, solid=!$preview)
    makepoly(ldraw_lib__box5(solid), step=step, col=col, unit=unit, alt=alt, line=line, solid=solid);
ldraw_lib__box5(line=0.2);
// file: ../p/box4t.scad
use <../lib.scad>
$fa=1; $fs=0.2;
function ldraw_lib__box4t(realsolid=false) = [
// 0 Box with 4 Adjacent Faces and All Edges
// 0 Name: box4t.dat
// 0 Author: Tore Eriksson [Tore_Eriksson]
// 0 !LDRAW_ORG Primitive UPDATE 2003-02
// 0 !LICENSE Licensed under CC BY 2.0 and CC BY 4.0 : see CAreadme.txt
// 
// 0 BFC CERTIFY CCW
  [0,"BFC","CERTIFY"],
  [0,"BFC","CCW"],
// 
// 0 !HISTORY 1997-09-29 [PTadmin] Official Update 1997-15
// 0 !HISTORY 2002-08-31 [izanette] Modified with WINDZ for BFC compliance
// 0 !HISTORY 2003-08-01 [PTadmin] Official Update 2003-02
// 0 !HISTORY 2007-06-24 [PTadmin] Header formatted for Contributor Agreement
// 0 !HISTORY 2008-07-01 [PTadmin] Official Update 2008-01
// 
// 
// 2 24 1 1 1 -1 1 1
  [2,24,1,1,1,-1,1,1],
// 2 24 -1 1 1 -1 1 -1
  [2,24,-1,1,1,-1,1,-1],
// 2 24 -1 1 -1 1 1 -1
  [2,24,-1,1,-1,1,1,-1],
// 2 24 1 1 -1 1 1 1
  [2,24,1,1,-1,1,1,1],
// 2 24 1 0 1 -1 0 1
  [2,24,1,0,1,-1,0,1],
// 2 24 -1 0 1 -1 0 -1
  [2,24,-1,0,1,-1,0,-1],
// 2 24 -1 0 -1 1 0 -1
  [2,24,-1,0,-1,1,0,-1],
// 2 24 1 0 -1 1 0 1
  [2,24,1,0,-1,1,0,1],
// 2 24 1 0 1 1 1 1
  [2,24,1,0,1,1,1,1],
// 2 24 -1 0 1 -1 1 1
  [2,24,-1,0,1,-1,1,1],
// 2 24 1 0 -1 1 1 -1
  [2,24,1,0,-1,1,1,-1],
// 2 24 -1 0 -1 -1 1 -1
  [2,24,-1,0,-1,-1,1,-1],
// 4 16 1 1 1 1 1 -1 -1 1 -1 -1 1 1
  [4,16,1,1,1,1,1,-1,-1,1,-1,-1,1,1],
// 4 16 1 1 1 -1 1 1 -1 0 1 1 0 1
  [4,16,1,1,1,-1,1,1,-1,0,1,1,0,1],
// 4 16 -1 1 1 -1 1 -1 -1 0 -1 -1 0 1
  [4,16,-1,1,1,-1,1,-1,-1,0,-1,-1,0,1],
// 0 4 16 -1 1 -1 -1 0 -1 1 0 -1 1 1 -1
// 4 16 1 1 -1 1 1 1 1 0 1 1 0 -1
  [4,16,1,1,-1,1,1,1,1,0,1,1,0,-1],
// 0
];
module ldraw_lib__box4t(step=0, col=false, unit=2/5, alt=false, line=0.2, solid=!$preview)
    makepoly(ldraw_lib__box4t(solid), step=step, col=col, unit=unit, alt=alt, line=line, solid=solid);
ldraw_lib__box4t(line=0.2);
// file: 3004.scad
use <../lib.scad>
use <s/3004s01.scad>
$fa=1; $fs=0.2;
function ldraw_lib__3004(realsolid=false) = [
// 0 Brick  1 x  2
// 0 Name: 3004.dat
// 0 Author: James Jessiman
// 0 !LDRAW_ORG Part UPDATE 2022-05
// 0 !LICENSE Licensed under CC BY 2.0 and CC BY 4.0 : see CAreadme.txt
// 
// 0 BFC CERTIFY CCW
  [0,"BFC","CERTIFY"],
  [0,"BFC","CCW"],
// 
// 0 !HISTORY 2001-10-26 [PTadmin] Official Update 2001-01
// 0 !HISTORY 2002-05-07 {unknown} BFC Certification
// 0 !HISTORY 2002-06-11 [PTadmin] Official Update 2002-03
// 0 !HISTORY 2007-05-07 [PTadmin] Header formatted for Contributor Agreement
// 0 !HISTORY 2008-07-01 [PTadmin] Official Update 2008-01
// 0 !HISTORY 2022-08-04 [MagFors] Using subfile
// 0 !HISTORY 2022-09-15 [PTadmin] Official Update 2022-05
// 
// 
// 1 16 0 0 0 1 0 0 0 1 0 0 0 1 s\3004s01.dat
  [1,16,0,0,0,1,0,0,0,1,0,0,0,1, ldraw_lib__s__3004s01(realsolid)],
// 4 16 -20 24 -10 20 24 -10 20 0 -10 -20 0 -10
  [4,16,-20,24,-10,20,24,-10,20,0,-10,-20,0,-10],
];
module ldraw_lib__3004(step=0, col=false, unit=2/5, alt=false, line=0.2, solid=!$preview)
    makepoly(ldraw_lib__3004(solid), step=step, col=col, unit=unit, alt=alt, line=line, solid=solid);
ldraw_lib__3004(line=0.2);
// file: s/3005s01.scad
use <../../lib.scad>
use <../../p/box4t.scad>
use <../../p/box5.scad>
use <../../p/stud.scad>
$fa=1; $fs=0.2;
function ldraw_lib__s__3005s01(realsolid=false) = [
// 0 ~Brick  1 x  1 without Front Face
// 0 Name: s\3005s01.dat
// 0 Author: John Riley [jriley]
// 0 !LDRAW_ORG Subpart UPDATE 2004-01
// 0 !LICENSE Licensed under CC BY 2.0 and CC BY 4.0 : see CAreadme.txt
// 
// 0 BFC CERTIFY CCW
  [0,"BFC","CERTIFY"],
  [0,"BFC","CCW"],
// 
// 0 !HISTORY 2003-09-07 [jriley] BFCed & Subfiled
// 0 !HISTORY 2004-03-02 [PTadmin] Official Update 2004-01
// 0 !HISTORY 2007-08-29 [PTadmin] Header formatted for Contributor Agreement
// 0 !HISTORY 2008-07-01 [PTadmin] Official Update 2008-01
// 
// 
// 0 BFC INVERTNEXT
  [0,"BFC","INVERTNEXT"],
// 1 16 0 24 0 0 0 6 0 -20 0 -6 0 0 box5.dat
  [1,16,0,24,0,0,0,6,0,-20,0,-6,0,0, ldraw_lib__box5(realsolid)],
// 4 16 10 24 -10 6 24 -6 6 24 6 10 24 10
  [4,16,10,24,-10,6,24,-6,6,24,6,10,24,10],
// 4 16 10 24 10 6 24 6 -6 24 6 -10 24 10
  [4,16,10,24,10,6,24,6,-6,24,6,-10,24,10],
// 4 16 -10 24 10 -6 24 6 -6 24 -6 -10 24 -10
  [4,16,-10,24,10,-6,24,6,-6,24,-6,-10,24,-10],
// 4 16 -10 24 -10 -6 24 -6 6 24 -6 10 24 -10
  [4,16,-10,24,-10,-6,24,-6,6,24,-6,10,24,-10],
// 1 16 0 24 0 10 0 0 0 -24 0 0 0 10 box4t.dat
  [1,16,0,24,0,10,0,0,0,-24,0,0,0,10, ldraw_lib__box4t(realsolid)],
// 1 16 0 0 0 0 0 1 0 1 0 -1 0 0 stud.dat
  [1,16,0,0,0,0,0,1,0,1,0,-1,0,0, ldraw_lib__stud(realsolid)],
// 0
];
module ldraw_lib__s__3005s01(step=0, col=false, unit=2/5, alt=false, line=0.2, solid=!$preview)
    makepoly(ldraw_lib__s__3005s01(solid), step=step, col=col, unit=unit, alt=alt, line=line, solid=solid);
ldraw_lib__s__3005s01(line=0.2);
// main file
use <../lib.scad>
use <s/3005s01.scad>
$fa=1; $fs=0.2;
function ldraw_lib__3005ptl(realsolid=false) = [
// 0 Brick  1 x  1 with Blue "L" Pattern
// 0 Name: 3005ptl.dat
// 0 Author: Tore Eriksson [Tore_Eriksson]
// 0 !LDRAW_ORG Part UPDATE 2015-01
// 0 !LICENSE Licensed under CC BY 2.0 and CC BY 4.0 : see CAreadme.txt
// 
// 0 BFC CERTIFY CCW
  [0,"BFC","CERTIFY"],
  [0,"BFC","CCW"],
// 
// 0 !HISTORY 2003-12-09 [Steffen] made use of existing subfile
// 0 !HISTORY 2004-04-22 [PTadmin] Official Update 2004-02
// 0 !HISTORY 2007-05-11 [PTadmin] Header formatted for Contributor Agreement
// 0 !HISTORY 2008-07-01 [PTadmin] Official Update 2008-01
// 0 !HISTORY 2014-12-22 [Holly-Wood] BFCed
// 0 !HISTORY 2015-10-11 [PTadmin] Official Update 2015-01
// 
// 
// 0 // Pattern
// 
// 4 1 -5 5 -10 -5 19 -10 -3 17 -10 -3 5 -10
  [4,1,-5,5,-10,-5,19,-10,-3,17,-10,-3,5,-10],
// 4 1 5 19 -10 5 17 -10 -3 17 -10 -5 19 -10
  [4,1,5,19,-10,5,17,-10,-3,17,-10,-5,19,-10],
// 
// 4 16 -10 0 -10 -5 5 -10 -3 5 -10 10 0 -10
  [4,16,-10,0,-10,-5,5,-10,-3,5,-10,10,0,-10],
// 4 16 10 0 -10 -3 5 -10 -3 17 -10 5 17 -10
  [4,16,10,0,-10,-3,5,-10,-3,17,-10,5,17,-10],
// 4 16 10 0 -10 5 17 -10 5 19 -10 10 24 -10
  [4,16,10,0,-10,5,17,-10,5,19,-10,10,24,-10],
// 4 16 10 24 -10 5 19 -10 -5 19 -10 -10 24 -10
  [4,16,10,24,-10,5,19,-10,-5,19,-10,-10,24,-10],
// 4 16 -10 24 -10 -5 19 -10 -5 5 -10 -10 0 -10
  [4,16,-10,24,-10,-5,19,-10,-5,5,-10,-10,0,-10],
// 
// 0 // Subfile
// 1 16 0 0 0 1 0 0 0 1 0 0 0 1 s\3005s01.dat
  [1,16,0,0,0,1,0,0,0,1,0,0,0,1, ldraw_lib__s__3005s01(realsolid)],
];
module ldraw_lib__3005ptl(step=0, col=false, unit=2/5, alt=false, line=0.2, solid=!$preview)
    makepoly(ldraw_lib__3005ptl(solid), step=step, col=col, unit=unit, alt=alt, line=line, solid=solid);
ldraw_lib__3005ptl(line=0.2);
